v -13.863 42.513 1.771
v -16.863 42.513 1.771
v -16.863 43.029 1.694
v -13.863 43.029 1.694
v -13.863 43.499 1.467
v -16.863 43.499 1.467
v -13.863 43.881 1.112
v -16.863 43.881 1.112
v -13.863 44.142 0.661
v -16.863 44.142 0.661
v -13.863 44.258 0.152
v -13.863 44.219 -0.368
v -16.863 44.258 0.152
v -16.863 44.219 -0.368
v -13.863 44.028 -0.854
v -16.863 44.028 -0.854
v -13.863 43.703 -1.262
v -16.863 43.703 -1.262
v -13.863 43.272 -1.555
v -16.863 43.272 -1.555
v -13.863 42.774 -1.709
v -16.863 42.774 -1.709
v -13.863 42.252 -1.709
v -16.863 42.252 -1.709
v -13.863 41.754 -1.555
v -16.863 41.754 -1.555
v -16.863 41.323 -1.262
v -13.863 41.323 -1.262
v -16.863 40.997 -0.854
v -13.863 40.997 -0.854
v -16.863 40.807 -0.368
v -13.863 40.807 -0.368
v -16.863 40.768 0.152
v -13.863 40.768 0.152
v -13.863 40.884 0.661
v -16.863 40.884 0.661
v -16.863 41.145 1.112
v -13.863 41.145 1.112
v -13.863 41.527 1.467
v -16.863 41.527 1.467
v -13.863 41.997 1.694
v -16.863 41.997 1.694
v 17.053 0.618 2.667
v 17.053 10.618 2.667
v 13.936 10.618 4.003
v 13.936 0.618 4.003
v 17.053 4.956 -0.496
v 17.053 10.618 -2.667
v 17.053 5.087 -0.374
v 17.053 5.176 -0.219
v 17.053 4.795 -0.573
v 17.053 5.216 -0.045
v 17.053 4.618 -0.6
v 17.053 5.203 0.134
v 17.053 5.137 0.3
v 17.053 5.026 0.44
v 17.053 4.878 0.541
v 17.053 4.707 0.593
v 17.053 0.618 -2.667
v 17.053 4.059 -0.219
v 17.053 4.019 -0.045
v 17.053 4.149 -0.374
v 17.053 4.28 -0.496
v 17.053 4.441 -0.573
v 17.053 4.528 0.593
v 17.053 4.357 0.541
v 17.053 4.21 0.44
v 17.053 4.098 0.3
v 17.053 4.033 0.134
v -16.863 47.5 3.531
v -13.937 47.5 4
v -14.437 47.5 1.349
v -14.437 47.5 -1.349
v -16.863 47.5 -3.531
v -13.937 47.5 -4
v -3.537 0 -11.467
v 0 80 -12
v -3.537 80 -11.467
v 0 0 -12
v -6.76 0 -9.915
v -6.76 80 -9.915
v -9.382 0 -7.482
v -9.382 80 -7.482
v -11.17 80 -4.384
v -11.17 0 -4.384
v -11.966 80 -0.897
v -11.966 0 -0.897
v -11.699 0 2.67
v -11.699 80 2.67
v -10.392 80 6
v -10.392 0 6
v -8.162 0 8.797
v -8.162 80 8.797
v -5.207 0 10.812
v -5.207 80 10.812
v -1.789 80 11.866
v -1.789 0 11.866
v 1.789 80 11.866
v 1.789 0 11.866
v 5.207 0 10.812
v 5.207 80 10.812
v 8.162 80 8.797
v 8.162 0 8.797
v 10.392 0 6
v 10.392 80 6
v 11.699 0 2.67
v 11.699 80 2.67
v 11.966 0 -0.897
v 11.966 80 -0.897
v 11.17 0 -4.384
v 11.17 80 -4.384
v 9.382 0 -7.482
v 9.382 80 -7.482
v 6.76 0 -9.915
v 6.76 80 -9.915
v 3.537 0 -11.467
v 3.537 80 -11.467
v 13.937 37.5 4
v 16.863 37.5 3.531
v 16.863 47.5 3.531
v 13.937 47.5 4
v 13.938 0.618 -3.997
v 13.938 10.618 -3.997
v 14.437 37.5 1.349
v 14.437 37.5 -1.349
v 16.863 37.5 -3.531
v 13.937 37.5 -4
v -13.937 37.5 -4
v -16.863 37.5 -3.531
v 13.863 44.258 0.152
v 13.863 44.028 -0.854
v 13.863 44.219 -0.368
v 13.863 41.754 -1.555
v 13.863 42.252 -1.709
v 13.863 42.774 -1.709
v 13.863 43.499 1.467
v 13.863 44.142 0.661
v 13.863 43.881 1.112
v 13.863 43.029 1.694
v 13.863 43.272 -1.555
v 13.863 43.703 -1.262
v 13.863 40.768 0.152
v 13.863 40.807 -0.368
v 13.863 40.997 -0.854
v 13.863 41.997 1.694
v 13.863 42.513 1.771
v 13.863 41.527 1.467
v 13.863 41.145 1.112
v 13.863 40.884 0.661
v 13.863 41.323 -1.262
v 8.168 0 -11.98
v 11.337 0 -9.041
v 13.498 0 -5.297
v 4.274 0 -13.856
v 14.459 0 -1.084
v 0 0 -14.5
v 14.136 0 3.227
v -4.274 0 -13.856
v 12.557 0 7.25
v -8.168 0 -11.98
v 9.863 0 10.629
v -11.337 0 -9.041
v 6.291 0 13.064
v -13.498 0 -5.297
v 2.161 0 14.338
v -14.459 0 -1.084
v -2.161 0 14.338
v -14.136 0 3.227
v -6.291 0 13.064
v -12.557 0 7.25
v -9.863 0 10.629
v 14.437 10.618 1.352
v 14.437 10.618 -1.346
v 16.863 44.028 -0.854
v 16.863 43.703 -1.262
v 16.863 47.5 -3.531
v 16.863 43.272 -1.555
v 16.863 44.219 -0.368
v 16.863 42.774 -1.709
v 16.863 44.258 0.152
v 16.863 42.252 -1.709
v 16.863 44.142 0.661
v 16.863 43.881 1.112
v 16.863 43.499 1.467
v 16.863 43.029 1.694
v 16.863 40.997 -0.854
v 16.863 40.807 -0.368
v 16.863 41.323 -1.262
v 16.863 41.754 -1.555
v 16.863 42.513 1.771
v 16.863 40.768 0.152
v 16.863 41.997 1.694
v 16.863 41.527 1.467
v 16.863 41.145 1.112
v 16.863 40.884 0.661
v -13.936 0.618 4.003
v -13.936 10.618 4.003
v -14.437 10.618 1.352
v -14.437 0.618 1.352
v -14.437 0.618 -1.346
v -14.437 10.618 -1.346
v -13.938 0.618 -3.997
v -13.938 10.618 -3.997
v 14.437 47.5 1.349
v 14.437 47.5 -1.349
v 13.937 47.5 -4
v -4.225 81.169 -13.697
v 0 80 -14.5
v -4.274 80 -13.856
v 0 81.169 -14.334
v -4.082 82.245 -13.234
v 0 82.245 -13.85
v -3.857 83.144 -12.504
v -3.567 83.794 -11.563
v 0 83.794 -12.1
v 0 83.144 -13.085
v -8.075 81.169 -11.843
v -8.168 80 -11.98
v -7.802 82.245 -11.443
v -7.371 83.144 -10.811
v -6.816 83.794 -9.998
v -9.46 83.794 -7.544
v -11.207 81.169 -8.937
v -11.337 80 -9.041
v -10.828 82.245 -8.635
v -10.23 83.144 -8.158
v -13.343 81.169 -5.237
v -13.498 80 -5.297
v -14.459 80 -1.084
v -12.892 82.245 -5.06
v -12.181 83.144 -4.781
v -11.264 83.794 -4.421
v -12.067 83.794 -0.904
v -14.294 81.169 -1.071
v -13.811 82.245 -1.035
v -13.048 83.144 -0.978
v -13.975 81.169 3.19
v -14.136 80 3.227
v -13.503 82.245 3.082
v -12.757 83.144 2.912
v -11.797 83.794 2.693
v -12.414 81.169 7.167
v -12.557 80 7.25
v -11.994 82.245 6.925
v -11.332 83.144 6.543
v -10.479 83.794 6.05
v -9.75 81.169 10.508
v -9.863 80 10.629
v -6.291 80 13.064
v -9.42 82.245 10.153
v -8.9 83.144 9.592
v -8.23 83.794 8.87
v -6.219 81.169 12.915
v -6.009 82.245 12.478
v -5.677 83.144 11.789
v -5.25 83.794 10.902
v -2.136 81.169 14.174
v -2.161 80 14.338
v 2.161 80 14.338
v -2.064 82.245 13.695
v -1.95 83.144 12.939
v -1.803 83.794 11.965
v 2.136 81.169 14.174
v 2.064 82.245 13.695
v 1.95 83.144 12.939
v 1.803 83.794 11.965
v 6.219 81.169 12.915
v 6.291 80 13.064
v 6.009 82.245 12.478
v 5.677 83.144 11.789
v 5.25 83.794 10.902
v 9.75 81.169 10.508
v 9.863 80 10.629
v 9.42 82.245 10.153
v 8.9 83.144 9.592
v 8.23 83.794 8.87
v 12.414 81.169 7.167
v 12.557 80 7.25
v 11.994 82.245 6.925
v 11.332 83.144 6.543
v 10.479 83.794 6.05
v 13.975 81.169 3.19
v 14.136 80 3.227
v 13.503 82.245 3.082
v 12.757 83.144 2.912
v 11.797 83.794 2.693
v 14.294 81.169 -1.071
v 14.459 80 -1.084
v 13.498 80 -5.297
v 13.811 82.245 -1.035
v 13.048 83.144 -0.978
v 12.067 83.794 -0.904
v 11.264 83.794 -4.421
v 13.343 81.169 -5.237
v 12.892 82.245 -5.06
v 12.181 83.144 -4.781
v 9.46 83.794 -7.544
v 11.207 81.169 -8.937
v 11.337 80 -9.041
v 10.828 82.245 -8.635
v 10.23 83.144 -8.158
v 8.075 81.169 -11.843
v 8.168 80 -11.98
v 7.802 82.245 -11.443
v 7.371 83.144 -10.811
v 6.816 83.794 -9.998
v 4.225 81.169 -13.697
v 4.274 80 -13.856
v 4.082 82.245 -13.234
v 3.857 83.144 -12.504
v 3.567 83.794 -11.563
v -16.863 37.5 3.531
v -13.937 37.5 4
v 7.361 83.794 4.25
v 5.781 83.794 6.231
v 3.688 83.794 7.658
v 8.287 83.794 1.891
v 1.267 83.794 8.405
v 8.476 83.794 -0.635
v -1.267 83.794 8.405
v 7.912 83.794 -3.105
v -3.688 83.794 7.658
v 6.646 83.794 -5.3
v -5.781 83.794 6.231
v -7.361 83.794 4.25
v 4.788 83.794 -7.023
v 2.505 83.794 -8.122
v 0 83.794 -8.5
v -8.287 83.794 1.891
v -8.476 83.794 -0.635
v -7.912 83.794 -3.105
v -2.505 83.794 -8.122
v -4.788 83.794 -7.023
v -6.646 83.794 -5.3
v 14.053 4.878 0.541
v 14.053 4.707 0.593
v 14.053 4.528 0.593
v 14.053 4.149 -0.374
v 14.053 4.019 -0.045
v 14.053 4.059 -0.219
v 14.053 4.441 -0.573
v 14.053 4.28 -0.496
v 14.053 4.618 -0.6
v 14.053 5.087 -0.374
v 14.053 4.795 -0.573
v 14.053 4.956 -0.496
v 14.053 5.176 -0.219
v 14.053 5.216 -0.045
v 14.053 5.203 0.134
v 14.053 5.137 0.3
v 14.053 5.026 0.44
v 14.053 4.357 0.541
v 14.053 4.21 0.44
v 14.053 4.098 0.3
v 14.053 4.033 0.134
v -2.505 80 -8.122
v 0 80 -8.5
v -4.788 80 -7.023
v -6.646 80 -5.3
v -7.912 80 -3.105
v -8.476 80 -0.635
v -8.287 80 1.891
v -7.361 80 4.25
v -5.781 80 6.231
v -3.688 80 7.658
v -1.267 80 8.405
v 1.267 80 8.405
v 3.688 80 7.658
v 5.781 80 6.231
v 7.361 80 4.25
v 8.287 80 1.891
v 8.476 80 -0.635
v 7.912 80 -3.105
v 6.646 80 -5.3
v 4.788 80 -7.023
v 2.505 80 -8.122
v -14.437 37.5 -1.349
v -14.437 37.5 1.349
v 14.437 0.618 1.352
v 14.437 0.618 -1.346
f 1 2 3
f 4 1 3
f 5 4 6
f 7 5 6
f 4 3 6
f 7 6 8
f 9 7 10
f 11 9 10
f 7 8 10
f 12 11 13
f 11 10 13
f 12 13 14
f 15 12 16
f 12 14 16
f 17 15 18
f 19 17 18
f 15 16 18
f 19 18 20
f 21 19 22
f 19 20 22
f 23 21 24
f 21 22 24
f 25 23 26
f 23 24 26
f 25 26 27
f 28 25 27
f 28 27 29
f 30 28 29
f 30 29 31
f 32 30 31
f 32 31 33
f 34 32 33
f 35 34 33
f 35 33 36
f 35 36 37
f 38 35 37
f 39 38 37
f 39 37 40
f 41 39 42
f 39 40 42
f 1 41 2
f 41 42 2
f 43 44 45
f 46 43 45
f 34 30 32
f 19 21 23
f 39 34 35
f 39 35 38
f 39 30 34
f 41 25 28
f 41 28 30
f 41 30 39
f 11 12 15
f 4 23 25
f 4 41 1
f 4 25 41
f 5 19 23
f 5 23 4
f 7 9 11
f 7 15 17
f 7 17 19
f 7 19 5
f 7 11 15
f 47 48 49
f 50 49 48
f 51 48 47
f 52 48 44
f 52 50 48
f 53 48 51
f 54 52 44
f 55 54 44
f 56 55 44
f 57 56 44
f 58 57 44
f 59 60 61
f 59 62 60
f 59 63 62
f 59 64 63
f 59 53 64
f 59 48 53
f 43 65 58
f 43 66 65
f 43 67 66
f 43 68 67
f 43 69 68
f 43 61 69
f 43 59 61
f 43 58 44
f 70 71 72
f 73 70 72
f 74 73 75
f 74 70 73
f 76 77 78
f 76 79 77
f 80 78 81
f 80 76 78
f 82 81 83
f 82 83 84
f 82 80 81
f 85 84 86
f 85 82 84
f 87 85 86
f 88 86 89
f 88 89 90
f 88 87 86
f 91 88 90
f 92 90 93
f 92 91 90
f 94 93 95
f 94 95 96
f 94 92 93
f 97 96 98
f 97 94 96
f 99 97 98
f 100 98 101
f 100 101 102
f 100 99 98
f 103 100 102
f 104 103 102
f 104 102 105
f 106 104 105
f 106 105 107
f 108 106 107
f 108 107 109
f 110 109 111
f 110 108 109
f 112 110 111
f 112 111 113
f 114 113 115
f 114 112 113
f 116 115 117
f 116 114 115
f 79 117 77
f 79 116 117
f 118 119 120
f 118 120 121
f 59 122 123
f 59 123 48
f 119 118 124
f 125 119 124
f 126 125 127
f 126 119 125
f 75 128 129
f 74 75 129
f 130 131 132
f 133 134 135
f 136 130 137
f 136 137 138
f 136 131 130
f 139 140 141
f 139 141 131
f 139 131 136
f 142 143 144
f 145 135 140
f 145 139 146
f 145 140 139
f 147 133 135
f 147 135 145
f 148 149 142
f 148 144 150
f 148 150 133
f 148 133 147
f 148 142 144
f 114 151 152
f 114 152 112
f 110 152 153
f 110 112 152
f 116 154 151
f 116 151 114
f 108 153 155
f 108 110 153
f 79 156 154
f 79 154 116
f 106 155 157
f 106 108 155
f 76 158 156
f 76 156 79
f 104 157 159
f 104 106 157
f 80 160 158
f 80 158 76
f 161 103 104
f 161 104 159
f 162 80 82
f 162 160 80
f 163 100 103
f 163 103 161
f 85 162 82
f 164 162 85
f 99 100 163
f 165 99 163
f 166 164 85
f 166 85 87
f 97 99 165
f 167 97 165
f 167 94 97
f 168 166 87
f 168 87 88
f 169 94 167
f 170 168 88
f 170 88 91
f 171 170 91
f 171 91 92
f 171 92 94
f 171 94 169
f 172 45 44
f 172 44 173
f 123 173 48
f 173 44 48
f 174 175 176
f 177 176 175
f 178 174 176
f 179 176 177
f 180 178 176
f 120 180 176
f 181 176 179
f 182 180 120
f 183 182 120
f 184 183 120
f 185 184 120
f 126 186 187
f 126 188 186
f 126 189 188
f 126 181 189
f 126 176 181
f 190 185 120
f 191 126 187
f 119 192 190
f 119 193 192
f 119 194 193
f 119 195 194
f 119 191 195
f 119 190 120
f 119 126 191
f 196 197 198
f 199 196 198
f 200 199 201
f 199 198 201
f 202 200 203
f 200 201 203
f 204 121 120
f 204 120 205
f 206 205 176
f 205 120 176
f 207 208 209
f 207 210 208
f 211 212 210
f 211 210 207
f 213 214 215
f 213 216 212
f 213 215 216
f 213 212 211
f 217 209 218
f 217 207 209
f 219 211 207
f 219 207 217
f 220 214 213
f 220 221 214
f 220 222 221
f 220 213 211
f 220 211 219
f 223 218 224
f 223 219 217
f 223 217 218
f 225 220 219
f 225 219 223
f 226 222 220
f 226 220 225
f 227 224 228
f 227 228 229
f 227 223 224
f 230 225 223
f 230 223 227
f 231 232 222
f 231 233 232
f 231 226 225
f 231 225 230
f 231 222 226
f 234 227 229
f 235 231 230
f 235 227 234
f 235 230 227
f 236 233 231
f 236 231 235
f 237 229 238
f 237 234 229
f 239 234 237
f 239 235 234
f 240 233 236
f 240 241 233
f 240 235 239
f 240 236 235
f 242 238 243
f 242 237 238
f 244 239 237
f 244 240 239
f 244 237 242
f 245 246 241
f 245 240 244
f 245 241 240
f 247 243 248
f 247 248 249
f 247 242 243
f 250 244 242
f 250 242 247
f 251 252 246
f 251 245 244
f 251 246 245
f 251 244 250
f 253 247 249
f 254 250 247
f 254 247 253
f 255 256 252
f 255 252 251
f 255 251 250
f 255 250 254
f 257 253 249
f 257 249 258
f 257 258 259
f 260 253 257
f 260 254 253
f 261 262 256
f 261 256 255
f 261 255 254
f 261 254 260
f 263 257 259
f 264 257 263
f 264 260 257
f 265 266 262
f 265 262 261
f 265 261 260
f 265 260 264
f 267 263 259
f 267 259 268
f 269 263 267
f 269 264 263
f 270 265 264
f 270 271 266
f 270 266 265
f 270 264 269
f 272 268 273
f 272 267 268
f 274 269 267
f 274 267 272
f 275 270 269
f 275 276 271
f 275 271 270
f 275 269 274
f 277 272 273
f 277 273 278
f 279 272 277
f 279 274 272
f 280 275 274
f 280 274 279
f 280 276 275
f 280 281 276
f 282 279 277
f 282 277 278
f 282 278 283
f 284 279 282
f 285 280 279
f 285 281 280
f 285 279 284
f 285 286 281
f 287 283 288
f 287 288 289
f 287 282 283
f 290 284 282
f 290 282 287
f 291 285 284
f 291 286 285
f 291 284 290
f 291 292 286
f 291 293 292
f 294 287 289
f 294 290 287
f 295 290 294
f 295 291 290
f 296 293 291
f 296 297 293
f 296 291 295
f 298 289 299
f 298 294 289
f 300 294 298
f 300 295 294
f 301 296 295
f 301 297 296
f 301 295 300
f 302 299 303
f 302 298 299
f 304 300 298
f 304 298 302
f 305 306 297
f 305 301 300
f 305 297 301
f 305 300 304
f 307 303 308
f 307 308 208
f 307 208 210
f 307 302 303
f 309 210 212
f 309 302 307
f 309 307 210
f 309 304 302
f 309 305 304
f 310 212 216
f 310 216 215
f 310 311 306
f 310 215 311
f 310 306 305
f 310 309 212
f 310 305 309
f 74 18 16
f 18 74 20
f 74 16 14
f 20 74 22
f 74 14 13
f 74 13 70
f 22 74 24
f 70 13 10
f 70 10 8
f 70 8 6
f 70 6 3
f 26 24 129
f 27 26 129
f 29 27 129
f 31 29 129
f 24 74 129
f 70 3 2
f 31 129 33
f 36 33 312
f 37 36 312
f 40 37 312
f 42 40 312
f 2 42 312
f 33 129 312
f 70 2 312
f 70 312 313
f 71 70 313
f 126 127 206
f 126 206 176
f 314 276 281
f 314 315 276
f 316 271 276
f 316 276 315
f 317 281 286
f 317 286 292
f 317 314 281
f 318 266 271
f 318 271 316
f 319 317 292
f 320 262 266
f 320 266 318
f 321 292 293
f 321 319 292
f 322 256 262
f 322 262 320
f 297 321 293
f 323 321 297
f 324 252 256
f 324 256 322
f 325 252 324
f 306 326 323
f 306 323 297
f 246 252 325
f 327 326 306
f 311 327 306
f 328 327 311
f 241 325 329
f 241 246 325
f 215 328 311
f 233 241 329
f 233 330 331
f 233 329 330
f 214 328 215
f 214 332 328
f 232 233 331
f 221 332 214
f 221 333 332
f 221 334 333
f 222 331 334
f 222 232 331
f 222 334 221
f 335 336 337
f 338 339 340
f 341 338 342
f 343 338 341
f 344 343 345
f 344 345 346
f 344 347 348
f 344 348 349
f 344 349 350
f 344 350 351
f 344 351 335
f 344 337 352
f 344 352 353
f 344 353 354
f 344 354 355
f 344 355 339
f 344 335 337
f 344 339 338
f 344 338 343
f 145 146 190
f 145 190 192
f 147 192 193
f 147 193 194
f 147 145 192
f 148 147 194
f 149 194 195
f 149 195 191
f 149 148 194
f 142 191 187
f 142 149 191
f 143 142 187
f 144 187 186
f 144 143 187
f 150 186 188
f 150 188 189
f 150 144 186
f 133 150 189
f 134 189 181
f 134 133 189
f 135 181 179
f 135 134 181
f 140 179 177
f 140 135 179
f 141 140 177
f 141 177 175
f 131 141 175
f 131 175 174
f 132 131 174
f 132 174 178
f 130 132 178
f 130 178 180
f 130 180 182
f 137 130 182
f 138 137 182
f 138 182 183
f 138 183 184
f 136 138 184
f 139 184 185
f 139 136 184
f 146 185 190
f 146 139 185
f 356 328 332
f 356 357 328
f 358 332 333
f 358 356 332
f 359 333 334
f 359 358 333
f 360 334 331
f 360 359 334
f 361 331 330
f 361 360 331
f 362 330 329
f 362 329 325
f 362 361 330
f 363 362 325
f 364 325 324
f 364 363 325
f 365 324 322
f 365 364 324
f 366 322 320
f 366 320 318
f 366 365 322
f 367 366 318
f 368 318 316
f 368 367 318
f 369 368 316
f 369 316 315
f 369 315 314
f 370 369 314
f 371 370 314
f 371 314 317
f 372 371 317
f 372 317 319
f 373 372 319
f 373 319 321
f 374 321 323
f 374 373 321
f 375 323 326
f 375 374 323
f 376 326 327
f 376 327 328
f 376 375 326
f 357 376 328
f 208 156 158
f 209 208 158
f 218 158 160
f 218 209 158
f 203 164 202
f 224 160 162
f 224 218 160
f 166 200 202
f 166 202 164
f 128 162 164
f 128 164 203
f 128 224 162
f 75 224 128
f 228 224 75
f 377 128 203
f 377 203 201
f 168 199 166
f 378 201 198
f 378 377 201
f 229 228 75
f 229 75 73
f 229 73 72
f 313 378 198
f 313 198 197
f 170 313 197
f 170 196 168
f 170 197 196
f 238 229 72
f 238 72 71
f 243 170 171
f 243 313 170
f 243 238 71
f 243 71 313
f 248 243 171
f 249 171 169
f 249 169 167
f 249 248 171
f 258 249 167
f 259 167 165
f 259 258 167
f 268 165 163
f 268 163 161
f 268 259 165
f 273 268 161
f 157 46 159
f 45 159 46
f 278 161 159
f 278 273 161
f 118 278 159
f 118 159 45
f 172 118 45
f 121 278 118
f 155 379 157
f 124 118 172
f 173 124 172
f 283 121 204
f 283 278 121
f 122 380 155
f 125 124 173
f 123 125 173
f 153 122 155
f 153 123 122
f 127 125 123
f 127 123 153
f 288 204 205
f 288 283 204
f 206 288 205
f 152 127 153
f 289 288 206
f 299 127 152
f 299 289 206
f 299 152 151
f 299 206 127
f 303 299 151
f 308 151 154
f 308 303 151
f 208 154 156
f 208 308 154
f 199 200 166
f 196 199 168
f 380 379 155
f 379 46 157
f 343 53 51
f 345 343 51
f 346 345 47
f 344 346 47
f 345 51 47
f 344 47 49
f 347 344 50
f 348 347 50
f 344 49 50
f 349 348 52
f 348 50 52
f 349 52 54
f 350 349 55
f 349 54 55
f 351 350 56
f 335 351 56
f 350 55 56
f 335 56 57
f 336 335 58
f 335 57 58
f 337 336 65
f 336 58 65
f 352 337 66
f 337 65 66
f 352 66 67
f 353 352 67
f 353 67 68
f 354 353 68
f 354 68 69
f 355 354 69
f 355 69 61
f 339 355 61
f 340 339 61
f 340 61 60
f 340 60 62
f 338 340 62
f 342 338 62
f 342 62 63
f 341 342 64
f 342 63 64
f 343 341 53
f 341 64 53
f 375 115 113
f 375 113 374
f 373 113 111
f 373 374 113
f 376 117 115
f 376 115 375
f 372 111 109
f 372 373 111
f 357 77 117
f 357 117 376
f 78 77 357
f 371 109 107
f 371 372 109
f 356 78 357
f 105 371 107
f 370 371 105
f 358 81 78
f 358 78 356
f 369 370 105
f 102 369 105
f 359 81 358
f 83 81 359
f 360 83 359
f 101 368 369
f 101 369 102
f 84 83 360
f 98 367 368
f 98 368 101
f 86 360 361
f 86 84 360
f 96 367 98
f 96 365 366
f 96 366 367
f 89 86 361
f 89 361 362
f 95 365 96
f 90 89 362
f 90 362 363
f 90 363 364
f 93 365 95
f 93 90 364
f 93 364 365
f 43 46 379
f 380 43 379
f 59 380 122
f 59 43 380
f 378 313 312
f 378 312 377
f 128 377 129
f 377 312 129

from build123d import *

# Parameters (mm, degrees)
BOSS_EXTRUDE1_REACH        = 91.067
BOSS_EXTRUDE1_START_RADIUS = 14.5
BOSS_EXTRUDE1_END_RADIUS   = 14.5
SKETCH5_W                  = 8
SKETCH5_H                  = 10
CUT_EXTRUDE1_START         = -10
CUT_EXTRUDE1_DEPTH         = 10
SKETCH8_R                  = 1.75
CUT_EXTRUDE2_DEPTH         = 3
CUT_EXTRUDE3_START         = -3
SKETCH9_R                  = 1.75
CUT_EXTRUDE3_DEPTH         = 3
CUT_EXTRUDE5_DEPTH         = 10
CUT_EXTRUDE8_START         = -10
CUT_EXTRUDE8_DEPTH         = 10
SKETCH13_R                 = 0.6
CUT_EXTRUDE9_DEPTH         = 3


# Read off the part's stored shape, not the designer's step: Cut-Extrude1, Cut-Extrude8
with BuildPart() as part:
    # Sketch1 → Revolve1 (revolve)
    with BuildSketch(Plane.XY, mode=Mode.PRIVATE) as revolve1_sk:
        with BuildLine():
            Line((12, 0), (14.5, 0))
            Line((14.5, 0), (14.5, 80))
            ThreePointArc((14.5, 80), (13.849763488, 82.244753612), (12.100400466, 83.794416583))
            Line((12.100400466, 83.794416583), (8.5, 83.794416583))
            Line((8.5, 83.794416583), (8.5, 80))
            Line((8.5, 80), (12, 80))
            Line((12, 80), (12, 0))
        make_face()
    revolve(revolve1_sk.sketch.rotate(Axis((0, 0, 0), (0, 1, 0)), 90), axis=Axis((0, 0, 0), (0, 1, 0)))

    # Boss-Extrude1: from a cylinder face, 91.067 long prism both ways, kept between that surface and its translate by the depth
    boss_extrude1_start = Plane(origin=(0, 24.058844, 0), z_dir=(0, -1, 0)) * Cylinder(BOSS_EXTRUDE1_START_RADIUS, 249.016312, mode=Mode.PRIVATE)
    boss_extrude1_end = Plane(origin=(2.8, 24.058844, 0), z_dir=(0, -1, 0)) * Cylinder(BOSS_EXTRUDE1_END_RADIUS, 249.016312, mode=Mode.PRIVATE)
    # Sketch5 → Boss-Extrude1 (add, from a surface)
    with BuildSketch(Plane(origin=(0, 0, 0), x_dir=(0, 0, -1), z_dir=(1, 0, 0)), mode=Mode.PRIVATE) as boss_extrude1_sk1:
        with Locations((-0.003167699, 5.61768818)):
            Rectangle(SKETCH5_W, SKETCH5_H)
    boss_extrude1_tool1 = extrude(boss_extrude1_sk1.sketch, amount=BOSS_EXTRUDE1_REACH, both=True, mode=Mode.PRIVATE)
    # Sketch5 → Boss-Extrude1 (add, from a surface)
    with BuildSketch(Plane(origin=(0, 0, 0), x_dir=(0, 0, -1), z_dir=(1, 0, 0)), mode=Mode.PRIVATE) as boss_extrude1_sk2:
        with Locations((0, 42.5)):
            Rectangle(SKETCH5_W, SKETCH5_H)
    boss_extrude1_tool2 = extrude(boss_extrude1_sk2.sketch, amount=BOSS_EXTRUDE1_REACH, both=True, mode=Mode.PRIVATE)
    boss_extrude1 = ((boss_extrude1_tool1 - boss_extrude1_start) & boss_extrude1_end).solids().sort_by_distance((15.337359, 5.617688, 0.003168))[0] + ((boss_extrude1_tool2 - boss_extrude1_start) & boss_extrude1_end).solids().sort_by_distance((15.337359, 5.617688, 0.003168))[0]
    add(boss_extrude1)

    # Cut-Extrude1 outline → Cut-Extrude1 (cut)
    with BuildSketch(Plane(origin=(0, 47.5, 0), x_dir=(1, 0, 0), z_dir=(0, 1, 0)).offset(CUT_EXTRUDE1_START)):
        with BuildLine():
            Line((16.737359865, 4), (13.937359865, 4))
            Line((13.937359865, 4), (16.863384202, 3.531462132))
            ThreePointArc((16.863384202, 3.531462132), (16.802331913, 3.766258222), (16.737359865, 4))
        make_face()
        with BuildLine():
            ThreePointArc((16.737359865, -4), (16.802331913, -3.766258222), (16.863384202, -3.531462132))
            Line((16.863384202, -3.531462132), (13.937359865, -4))
            Line((13.937359865, -4), (16.737359865, -4))
        make_face()
        with BuildLine():
            ThreePointArc((16.863384202, -3.531462132), (17.3, 0), (16.863384202, 3.531462132))
            Line((16.863384202, 3.531462132), (16.863384202, -3.531462132))
        make_face()
    cut_extrude1 = extrude(amount=CUT_EXTRUDE1_DEPTH, mode=Mode.SUBTRACT)

    # Mirror2: Boss-Extrude1, Cut-Extrude1 across plane
    add(boss_extrude1.mirror(Plane(origin=(0, 0, 0), x_dir=(0, 0, 1), z_dir=(1, 0, 0))))
    add(cut_extrude1.mirror(Plane(origin=(0, 0, 0), x_dir=(0, 0, 1), z_dir=(1, 0, 0))), mode=Mode.SUBTRACT)

    # Sketch8 → Cut-Extrude2 (cut)
    with BuildSketch(Plane.ZY.offset(16.863384202)):
        with Locations((0.02126458, 42.512867657)):
            Circle(SKETCH8_R)
    extrude(amount=-CUT_EXTRUDE2_DEPTH, mode=Mode.SUBTRACT)

    # Sketch9 → Cut-Extrude3 (cut)
    with BuildSketch(Plane(origin=(16.863384202, 0, 0), x_dir=(0, 0, -1), z_dir=(1, 0, 0)).offset(CUT_EXTRUDE3_START)):
        with Locations(Location((-0.02126458, 42.512867657, 0), (0, 0, 180))):
            Circle(SKETCH9_R)
    extrude(amount=CUT_EXTRUDE3_DEPTH, mode=Mode.SUBTRACT)

    # Sketch11 → Cut-Extrude5 (cut)
    with BuildSketch(Plane(origin=(0, 10.61768818, 0), x_dir=(1, 0, 0), z_dir=(0, 1, 0))):
        with BuildLine():
            Line((-13.9382686, 3.996832301), (-16.7382686, 3.996832301))
            ThreePointArc((-16.7382686, 3.996832301), (-17.299999625, -0.003295577), (-16.73645035, -4.003167699))
            Line((-16.73645035, -4.003167699), (-13.93645035, -4.003167699))
            ThreePointArc((-13.93645035, -4.003167699), (-14.499999625, -0.003295577), (-13.9382686, 3.996832301))
        make_face()
    extrude(amount=-CUT_EXTRUDE5_DEPTH, mode=Mode.SUBTRACT)

    # Cut-Extrude8 outline → Cut-Extrude8 (cut)
    with BuildSketch(Plane(origin=(0, 10.61768818, 0), x_dir=(1, 0, 0), z_dir=(0, 1, 0)).offset(CUT_EXTRUDE8_START)):
        with BuildLine():
            Line((16.7382686, 3.996832301), (13.9382686, 3.996832301))
            Line((13.9382686, 3.996832301), (17.052533954, 2.667447447))
            ThreePointArc((17.052533954, 2.667447447), (16.91106492, 3.335842745), (16.7382686, 3.996832301))
        make_face()
        with BuildLine():
            ThreePointArc((16.73645035, -4.003167699), (16.910306381, -3.339049838), (17.052533954, -2.667447447))
            Line((17.052533954, -2.667447447), (13.93645035, -4.003167699))
            Line((13.93645035, -4.003167699), (16.73645035, -4.003167699))
        make_face()
        with BuildLine():
            ThreePointArc((17.052533954, -2.667447447), (17.3, 0), (17.052533954, 2.667447447))
            Line((17.052533954, 2.667447447), (17.052533954, -2.667447447))
        make_face()
    extrude(amount=CUT_EXTRUDE8_DEPTH, mode=Mode.SUBTRACT)

    # Sketch13 → Cut-Extrude9 (cut)
    with BuildSketch(Plane(origin=(17.052533954, 0, 0), x_dir=(0, 0, -1), z_dir=(1, 0, 0))):
        with Locations((0, 4.61768818)):
            Circle(SKETCH13_R)
    extrude(amount=-CUT_EXTRUDE9_DEPTH, mode=Mode.SUBTRACT)


solid = part.part
